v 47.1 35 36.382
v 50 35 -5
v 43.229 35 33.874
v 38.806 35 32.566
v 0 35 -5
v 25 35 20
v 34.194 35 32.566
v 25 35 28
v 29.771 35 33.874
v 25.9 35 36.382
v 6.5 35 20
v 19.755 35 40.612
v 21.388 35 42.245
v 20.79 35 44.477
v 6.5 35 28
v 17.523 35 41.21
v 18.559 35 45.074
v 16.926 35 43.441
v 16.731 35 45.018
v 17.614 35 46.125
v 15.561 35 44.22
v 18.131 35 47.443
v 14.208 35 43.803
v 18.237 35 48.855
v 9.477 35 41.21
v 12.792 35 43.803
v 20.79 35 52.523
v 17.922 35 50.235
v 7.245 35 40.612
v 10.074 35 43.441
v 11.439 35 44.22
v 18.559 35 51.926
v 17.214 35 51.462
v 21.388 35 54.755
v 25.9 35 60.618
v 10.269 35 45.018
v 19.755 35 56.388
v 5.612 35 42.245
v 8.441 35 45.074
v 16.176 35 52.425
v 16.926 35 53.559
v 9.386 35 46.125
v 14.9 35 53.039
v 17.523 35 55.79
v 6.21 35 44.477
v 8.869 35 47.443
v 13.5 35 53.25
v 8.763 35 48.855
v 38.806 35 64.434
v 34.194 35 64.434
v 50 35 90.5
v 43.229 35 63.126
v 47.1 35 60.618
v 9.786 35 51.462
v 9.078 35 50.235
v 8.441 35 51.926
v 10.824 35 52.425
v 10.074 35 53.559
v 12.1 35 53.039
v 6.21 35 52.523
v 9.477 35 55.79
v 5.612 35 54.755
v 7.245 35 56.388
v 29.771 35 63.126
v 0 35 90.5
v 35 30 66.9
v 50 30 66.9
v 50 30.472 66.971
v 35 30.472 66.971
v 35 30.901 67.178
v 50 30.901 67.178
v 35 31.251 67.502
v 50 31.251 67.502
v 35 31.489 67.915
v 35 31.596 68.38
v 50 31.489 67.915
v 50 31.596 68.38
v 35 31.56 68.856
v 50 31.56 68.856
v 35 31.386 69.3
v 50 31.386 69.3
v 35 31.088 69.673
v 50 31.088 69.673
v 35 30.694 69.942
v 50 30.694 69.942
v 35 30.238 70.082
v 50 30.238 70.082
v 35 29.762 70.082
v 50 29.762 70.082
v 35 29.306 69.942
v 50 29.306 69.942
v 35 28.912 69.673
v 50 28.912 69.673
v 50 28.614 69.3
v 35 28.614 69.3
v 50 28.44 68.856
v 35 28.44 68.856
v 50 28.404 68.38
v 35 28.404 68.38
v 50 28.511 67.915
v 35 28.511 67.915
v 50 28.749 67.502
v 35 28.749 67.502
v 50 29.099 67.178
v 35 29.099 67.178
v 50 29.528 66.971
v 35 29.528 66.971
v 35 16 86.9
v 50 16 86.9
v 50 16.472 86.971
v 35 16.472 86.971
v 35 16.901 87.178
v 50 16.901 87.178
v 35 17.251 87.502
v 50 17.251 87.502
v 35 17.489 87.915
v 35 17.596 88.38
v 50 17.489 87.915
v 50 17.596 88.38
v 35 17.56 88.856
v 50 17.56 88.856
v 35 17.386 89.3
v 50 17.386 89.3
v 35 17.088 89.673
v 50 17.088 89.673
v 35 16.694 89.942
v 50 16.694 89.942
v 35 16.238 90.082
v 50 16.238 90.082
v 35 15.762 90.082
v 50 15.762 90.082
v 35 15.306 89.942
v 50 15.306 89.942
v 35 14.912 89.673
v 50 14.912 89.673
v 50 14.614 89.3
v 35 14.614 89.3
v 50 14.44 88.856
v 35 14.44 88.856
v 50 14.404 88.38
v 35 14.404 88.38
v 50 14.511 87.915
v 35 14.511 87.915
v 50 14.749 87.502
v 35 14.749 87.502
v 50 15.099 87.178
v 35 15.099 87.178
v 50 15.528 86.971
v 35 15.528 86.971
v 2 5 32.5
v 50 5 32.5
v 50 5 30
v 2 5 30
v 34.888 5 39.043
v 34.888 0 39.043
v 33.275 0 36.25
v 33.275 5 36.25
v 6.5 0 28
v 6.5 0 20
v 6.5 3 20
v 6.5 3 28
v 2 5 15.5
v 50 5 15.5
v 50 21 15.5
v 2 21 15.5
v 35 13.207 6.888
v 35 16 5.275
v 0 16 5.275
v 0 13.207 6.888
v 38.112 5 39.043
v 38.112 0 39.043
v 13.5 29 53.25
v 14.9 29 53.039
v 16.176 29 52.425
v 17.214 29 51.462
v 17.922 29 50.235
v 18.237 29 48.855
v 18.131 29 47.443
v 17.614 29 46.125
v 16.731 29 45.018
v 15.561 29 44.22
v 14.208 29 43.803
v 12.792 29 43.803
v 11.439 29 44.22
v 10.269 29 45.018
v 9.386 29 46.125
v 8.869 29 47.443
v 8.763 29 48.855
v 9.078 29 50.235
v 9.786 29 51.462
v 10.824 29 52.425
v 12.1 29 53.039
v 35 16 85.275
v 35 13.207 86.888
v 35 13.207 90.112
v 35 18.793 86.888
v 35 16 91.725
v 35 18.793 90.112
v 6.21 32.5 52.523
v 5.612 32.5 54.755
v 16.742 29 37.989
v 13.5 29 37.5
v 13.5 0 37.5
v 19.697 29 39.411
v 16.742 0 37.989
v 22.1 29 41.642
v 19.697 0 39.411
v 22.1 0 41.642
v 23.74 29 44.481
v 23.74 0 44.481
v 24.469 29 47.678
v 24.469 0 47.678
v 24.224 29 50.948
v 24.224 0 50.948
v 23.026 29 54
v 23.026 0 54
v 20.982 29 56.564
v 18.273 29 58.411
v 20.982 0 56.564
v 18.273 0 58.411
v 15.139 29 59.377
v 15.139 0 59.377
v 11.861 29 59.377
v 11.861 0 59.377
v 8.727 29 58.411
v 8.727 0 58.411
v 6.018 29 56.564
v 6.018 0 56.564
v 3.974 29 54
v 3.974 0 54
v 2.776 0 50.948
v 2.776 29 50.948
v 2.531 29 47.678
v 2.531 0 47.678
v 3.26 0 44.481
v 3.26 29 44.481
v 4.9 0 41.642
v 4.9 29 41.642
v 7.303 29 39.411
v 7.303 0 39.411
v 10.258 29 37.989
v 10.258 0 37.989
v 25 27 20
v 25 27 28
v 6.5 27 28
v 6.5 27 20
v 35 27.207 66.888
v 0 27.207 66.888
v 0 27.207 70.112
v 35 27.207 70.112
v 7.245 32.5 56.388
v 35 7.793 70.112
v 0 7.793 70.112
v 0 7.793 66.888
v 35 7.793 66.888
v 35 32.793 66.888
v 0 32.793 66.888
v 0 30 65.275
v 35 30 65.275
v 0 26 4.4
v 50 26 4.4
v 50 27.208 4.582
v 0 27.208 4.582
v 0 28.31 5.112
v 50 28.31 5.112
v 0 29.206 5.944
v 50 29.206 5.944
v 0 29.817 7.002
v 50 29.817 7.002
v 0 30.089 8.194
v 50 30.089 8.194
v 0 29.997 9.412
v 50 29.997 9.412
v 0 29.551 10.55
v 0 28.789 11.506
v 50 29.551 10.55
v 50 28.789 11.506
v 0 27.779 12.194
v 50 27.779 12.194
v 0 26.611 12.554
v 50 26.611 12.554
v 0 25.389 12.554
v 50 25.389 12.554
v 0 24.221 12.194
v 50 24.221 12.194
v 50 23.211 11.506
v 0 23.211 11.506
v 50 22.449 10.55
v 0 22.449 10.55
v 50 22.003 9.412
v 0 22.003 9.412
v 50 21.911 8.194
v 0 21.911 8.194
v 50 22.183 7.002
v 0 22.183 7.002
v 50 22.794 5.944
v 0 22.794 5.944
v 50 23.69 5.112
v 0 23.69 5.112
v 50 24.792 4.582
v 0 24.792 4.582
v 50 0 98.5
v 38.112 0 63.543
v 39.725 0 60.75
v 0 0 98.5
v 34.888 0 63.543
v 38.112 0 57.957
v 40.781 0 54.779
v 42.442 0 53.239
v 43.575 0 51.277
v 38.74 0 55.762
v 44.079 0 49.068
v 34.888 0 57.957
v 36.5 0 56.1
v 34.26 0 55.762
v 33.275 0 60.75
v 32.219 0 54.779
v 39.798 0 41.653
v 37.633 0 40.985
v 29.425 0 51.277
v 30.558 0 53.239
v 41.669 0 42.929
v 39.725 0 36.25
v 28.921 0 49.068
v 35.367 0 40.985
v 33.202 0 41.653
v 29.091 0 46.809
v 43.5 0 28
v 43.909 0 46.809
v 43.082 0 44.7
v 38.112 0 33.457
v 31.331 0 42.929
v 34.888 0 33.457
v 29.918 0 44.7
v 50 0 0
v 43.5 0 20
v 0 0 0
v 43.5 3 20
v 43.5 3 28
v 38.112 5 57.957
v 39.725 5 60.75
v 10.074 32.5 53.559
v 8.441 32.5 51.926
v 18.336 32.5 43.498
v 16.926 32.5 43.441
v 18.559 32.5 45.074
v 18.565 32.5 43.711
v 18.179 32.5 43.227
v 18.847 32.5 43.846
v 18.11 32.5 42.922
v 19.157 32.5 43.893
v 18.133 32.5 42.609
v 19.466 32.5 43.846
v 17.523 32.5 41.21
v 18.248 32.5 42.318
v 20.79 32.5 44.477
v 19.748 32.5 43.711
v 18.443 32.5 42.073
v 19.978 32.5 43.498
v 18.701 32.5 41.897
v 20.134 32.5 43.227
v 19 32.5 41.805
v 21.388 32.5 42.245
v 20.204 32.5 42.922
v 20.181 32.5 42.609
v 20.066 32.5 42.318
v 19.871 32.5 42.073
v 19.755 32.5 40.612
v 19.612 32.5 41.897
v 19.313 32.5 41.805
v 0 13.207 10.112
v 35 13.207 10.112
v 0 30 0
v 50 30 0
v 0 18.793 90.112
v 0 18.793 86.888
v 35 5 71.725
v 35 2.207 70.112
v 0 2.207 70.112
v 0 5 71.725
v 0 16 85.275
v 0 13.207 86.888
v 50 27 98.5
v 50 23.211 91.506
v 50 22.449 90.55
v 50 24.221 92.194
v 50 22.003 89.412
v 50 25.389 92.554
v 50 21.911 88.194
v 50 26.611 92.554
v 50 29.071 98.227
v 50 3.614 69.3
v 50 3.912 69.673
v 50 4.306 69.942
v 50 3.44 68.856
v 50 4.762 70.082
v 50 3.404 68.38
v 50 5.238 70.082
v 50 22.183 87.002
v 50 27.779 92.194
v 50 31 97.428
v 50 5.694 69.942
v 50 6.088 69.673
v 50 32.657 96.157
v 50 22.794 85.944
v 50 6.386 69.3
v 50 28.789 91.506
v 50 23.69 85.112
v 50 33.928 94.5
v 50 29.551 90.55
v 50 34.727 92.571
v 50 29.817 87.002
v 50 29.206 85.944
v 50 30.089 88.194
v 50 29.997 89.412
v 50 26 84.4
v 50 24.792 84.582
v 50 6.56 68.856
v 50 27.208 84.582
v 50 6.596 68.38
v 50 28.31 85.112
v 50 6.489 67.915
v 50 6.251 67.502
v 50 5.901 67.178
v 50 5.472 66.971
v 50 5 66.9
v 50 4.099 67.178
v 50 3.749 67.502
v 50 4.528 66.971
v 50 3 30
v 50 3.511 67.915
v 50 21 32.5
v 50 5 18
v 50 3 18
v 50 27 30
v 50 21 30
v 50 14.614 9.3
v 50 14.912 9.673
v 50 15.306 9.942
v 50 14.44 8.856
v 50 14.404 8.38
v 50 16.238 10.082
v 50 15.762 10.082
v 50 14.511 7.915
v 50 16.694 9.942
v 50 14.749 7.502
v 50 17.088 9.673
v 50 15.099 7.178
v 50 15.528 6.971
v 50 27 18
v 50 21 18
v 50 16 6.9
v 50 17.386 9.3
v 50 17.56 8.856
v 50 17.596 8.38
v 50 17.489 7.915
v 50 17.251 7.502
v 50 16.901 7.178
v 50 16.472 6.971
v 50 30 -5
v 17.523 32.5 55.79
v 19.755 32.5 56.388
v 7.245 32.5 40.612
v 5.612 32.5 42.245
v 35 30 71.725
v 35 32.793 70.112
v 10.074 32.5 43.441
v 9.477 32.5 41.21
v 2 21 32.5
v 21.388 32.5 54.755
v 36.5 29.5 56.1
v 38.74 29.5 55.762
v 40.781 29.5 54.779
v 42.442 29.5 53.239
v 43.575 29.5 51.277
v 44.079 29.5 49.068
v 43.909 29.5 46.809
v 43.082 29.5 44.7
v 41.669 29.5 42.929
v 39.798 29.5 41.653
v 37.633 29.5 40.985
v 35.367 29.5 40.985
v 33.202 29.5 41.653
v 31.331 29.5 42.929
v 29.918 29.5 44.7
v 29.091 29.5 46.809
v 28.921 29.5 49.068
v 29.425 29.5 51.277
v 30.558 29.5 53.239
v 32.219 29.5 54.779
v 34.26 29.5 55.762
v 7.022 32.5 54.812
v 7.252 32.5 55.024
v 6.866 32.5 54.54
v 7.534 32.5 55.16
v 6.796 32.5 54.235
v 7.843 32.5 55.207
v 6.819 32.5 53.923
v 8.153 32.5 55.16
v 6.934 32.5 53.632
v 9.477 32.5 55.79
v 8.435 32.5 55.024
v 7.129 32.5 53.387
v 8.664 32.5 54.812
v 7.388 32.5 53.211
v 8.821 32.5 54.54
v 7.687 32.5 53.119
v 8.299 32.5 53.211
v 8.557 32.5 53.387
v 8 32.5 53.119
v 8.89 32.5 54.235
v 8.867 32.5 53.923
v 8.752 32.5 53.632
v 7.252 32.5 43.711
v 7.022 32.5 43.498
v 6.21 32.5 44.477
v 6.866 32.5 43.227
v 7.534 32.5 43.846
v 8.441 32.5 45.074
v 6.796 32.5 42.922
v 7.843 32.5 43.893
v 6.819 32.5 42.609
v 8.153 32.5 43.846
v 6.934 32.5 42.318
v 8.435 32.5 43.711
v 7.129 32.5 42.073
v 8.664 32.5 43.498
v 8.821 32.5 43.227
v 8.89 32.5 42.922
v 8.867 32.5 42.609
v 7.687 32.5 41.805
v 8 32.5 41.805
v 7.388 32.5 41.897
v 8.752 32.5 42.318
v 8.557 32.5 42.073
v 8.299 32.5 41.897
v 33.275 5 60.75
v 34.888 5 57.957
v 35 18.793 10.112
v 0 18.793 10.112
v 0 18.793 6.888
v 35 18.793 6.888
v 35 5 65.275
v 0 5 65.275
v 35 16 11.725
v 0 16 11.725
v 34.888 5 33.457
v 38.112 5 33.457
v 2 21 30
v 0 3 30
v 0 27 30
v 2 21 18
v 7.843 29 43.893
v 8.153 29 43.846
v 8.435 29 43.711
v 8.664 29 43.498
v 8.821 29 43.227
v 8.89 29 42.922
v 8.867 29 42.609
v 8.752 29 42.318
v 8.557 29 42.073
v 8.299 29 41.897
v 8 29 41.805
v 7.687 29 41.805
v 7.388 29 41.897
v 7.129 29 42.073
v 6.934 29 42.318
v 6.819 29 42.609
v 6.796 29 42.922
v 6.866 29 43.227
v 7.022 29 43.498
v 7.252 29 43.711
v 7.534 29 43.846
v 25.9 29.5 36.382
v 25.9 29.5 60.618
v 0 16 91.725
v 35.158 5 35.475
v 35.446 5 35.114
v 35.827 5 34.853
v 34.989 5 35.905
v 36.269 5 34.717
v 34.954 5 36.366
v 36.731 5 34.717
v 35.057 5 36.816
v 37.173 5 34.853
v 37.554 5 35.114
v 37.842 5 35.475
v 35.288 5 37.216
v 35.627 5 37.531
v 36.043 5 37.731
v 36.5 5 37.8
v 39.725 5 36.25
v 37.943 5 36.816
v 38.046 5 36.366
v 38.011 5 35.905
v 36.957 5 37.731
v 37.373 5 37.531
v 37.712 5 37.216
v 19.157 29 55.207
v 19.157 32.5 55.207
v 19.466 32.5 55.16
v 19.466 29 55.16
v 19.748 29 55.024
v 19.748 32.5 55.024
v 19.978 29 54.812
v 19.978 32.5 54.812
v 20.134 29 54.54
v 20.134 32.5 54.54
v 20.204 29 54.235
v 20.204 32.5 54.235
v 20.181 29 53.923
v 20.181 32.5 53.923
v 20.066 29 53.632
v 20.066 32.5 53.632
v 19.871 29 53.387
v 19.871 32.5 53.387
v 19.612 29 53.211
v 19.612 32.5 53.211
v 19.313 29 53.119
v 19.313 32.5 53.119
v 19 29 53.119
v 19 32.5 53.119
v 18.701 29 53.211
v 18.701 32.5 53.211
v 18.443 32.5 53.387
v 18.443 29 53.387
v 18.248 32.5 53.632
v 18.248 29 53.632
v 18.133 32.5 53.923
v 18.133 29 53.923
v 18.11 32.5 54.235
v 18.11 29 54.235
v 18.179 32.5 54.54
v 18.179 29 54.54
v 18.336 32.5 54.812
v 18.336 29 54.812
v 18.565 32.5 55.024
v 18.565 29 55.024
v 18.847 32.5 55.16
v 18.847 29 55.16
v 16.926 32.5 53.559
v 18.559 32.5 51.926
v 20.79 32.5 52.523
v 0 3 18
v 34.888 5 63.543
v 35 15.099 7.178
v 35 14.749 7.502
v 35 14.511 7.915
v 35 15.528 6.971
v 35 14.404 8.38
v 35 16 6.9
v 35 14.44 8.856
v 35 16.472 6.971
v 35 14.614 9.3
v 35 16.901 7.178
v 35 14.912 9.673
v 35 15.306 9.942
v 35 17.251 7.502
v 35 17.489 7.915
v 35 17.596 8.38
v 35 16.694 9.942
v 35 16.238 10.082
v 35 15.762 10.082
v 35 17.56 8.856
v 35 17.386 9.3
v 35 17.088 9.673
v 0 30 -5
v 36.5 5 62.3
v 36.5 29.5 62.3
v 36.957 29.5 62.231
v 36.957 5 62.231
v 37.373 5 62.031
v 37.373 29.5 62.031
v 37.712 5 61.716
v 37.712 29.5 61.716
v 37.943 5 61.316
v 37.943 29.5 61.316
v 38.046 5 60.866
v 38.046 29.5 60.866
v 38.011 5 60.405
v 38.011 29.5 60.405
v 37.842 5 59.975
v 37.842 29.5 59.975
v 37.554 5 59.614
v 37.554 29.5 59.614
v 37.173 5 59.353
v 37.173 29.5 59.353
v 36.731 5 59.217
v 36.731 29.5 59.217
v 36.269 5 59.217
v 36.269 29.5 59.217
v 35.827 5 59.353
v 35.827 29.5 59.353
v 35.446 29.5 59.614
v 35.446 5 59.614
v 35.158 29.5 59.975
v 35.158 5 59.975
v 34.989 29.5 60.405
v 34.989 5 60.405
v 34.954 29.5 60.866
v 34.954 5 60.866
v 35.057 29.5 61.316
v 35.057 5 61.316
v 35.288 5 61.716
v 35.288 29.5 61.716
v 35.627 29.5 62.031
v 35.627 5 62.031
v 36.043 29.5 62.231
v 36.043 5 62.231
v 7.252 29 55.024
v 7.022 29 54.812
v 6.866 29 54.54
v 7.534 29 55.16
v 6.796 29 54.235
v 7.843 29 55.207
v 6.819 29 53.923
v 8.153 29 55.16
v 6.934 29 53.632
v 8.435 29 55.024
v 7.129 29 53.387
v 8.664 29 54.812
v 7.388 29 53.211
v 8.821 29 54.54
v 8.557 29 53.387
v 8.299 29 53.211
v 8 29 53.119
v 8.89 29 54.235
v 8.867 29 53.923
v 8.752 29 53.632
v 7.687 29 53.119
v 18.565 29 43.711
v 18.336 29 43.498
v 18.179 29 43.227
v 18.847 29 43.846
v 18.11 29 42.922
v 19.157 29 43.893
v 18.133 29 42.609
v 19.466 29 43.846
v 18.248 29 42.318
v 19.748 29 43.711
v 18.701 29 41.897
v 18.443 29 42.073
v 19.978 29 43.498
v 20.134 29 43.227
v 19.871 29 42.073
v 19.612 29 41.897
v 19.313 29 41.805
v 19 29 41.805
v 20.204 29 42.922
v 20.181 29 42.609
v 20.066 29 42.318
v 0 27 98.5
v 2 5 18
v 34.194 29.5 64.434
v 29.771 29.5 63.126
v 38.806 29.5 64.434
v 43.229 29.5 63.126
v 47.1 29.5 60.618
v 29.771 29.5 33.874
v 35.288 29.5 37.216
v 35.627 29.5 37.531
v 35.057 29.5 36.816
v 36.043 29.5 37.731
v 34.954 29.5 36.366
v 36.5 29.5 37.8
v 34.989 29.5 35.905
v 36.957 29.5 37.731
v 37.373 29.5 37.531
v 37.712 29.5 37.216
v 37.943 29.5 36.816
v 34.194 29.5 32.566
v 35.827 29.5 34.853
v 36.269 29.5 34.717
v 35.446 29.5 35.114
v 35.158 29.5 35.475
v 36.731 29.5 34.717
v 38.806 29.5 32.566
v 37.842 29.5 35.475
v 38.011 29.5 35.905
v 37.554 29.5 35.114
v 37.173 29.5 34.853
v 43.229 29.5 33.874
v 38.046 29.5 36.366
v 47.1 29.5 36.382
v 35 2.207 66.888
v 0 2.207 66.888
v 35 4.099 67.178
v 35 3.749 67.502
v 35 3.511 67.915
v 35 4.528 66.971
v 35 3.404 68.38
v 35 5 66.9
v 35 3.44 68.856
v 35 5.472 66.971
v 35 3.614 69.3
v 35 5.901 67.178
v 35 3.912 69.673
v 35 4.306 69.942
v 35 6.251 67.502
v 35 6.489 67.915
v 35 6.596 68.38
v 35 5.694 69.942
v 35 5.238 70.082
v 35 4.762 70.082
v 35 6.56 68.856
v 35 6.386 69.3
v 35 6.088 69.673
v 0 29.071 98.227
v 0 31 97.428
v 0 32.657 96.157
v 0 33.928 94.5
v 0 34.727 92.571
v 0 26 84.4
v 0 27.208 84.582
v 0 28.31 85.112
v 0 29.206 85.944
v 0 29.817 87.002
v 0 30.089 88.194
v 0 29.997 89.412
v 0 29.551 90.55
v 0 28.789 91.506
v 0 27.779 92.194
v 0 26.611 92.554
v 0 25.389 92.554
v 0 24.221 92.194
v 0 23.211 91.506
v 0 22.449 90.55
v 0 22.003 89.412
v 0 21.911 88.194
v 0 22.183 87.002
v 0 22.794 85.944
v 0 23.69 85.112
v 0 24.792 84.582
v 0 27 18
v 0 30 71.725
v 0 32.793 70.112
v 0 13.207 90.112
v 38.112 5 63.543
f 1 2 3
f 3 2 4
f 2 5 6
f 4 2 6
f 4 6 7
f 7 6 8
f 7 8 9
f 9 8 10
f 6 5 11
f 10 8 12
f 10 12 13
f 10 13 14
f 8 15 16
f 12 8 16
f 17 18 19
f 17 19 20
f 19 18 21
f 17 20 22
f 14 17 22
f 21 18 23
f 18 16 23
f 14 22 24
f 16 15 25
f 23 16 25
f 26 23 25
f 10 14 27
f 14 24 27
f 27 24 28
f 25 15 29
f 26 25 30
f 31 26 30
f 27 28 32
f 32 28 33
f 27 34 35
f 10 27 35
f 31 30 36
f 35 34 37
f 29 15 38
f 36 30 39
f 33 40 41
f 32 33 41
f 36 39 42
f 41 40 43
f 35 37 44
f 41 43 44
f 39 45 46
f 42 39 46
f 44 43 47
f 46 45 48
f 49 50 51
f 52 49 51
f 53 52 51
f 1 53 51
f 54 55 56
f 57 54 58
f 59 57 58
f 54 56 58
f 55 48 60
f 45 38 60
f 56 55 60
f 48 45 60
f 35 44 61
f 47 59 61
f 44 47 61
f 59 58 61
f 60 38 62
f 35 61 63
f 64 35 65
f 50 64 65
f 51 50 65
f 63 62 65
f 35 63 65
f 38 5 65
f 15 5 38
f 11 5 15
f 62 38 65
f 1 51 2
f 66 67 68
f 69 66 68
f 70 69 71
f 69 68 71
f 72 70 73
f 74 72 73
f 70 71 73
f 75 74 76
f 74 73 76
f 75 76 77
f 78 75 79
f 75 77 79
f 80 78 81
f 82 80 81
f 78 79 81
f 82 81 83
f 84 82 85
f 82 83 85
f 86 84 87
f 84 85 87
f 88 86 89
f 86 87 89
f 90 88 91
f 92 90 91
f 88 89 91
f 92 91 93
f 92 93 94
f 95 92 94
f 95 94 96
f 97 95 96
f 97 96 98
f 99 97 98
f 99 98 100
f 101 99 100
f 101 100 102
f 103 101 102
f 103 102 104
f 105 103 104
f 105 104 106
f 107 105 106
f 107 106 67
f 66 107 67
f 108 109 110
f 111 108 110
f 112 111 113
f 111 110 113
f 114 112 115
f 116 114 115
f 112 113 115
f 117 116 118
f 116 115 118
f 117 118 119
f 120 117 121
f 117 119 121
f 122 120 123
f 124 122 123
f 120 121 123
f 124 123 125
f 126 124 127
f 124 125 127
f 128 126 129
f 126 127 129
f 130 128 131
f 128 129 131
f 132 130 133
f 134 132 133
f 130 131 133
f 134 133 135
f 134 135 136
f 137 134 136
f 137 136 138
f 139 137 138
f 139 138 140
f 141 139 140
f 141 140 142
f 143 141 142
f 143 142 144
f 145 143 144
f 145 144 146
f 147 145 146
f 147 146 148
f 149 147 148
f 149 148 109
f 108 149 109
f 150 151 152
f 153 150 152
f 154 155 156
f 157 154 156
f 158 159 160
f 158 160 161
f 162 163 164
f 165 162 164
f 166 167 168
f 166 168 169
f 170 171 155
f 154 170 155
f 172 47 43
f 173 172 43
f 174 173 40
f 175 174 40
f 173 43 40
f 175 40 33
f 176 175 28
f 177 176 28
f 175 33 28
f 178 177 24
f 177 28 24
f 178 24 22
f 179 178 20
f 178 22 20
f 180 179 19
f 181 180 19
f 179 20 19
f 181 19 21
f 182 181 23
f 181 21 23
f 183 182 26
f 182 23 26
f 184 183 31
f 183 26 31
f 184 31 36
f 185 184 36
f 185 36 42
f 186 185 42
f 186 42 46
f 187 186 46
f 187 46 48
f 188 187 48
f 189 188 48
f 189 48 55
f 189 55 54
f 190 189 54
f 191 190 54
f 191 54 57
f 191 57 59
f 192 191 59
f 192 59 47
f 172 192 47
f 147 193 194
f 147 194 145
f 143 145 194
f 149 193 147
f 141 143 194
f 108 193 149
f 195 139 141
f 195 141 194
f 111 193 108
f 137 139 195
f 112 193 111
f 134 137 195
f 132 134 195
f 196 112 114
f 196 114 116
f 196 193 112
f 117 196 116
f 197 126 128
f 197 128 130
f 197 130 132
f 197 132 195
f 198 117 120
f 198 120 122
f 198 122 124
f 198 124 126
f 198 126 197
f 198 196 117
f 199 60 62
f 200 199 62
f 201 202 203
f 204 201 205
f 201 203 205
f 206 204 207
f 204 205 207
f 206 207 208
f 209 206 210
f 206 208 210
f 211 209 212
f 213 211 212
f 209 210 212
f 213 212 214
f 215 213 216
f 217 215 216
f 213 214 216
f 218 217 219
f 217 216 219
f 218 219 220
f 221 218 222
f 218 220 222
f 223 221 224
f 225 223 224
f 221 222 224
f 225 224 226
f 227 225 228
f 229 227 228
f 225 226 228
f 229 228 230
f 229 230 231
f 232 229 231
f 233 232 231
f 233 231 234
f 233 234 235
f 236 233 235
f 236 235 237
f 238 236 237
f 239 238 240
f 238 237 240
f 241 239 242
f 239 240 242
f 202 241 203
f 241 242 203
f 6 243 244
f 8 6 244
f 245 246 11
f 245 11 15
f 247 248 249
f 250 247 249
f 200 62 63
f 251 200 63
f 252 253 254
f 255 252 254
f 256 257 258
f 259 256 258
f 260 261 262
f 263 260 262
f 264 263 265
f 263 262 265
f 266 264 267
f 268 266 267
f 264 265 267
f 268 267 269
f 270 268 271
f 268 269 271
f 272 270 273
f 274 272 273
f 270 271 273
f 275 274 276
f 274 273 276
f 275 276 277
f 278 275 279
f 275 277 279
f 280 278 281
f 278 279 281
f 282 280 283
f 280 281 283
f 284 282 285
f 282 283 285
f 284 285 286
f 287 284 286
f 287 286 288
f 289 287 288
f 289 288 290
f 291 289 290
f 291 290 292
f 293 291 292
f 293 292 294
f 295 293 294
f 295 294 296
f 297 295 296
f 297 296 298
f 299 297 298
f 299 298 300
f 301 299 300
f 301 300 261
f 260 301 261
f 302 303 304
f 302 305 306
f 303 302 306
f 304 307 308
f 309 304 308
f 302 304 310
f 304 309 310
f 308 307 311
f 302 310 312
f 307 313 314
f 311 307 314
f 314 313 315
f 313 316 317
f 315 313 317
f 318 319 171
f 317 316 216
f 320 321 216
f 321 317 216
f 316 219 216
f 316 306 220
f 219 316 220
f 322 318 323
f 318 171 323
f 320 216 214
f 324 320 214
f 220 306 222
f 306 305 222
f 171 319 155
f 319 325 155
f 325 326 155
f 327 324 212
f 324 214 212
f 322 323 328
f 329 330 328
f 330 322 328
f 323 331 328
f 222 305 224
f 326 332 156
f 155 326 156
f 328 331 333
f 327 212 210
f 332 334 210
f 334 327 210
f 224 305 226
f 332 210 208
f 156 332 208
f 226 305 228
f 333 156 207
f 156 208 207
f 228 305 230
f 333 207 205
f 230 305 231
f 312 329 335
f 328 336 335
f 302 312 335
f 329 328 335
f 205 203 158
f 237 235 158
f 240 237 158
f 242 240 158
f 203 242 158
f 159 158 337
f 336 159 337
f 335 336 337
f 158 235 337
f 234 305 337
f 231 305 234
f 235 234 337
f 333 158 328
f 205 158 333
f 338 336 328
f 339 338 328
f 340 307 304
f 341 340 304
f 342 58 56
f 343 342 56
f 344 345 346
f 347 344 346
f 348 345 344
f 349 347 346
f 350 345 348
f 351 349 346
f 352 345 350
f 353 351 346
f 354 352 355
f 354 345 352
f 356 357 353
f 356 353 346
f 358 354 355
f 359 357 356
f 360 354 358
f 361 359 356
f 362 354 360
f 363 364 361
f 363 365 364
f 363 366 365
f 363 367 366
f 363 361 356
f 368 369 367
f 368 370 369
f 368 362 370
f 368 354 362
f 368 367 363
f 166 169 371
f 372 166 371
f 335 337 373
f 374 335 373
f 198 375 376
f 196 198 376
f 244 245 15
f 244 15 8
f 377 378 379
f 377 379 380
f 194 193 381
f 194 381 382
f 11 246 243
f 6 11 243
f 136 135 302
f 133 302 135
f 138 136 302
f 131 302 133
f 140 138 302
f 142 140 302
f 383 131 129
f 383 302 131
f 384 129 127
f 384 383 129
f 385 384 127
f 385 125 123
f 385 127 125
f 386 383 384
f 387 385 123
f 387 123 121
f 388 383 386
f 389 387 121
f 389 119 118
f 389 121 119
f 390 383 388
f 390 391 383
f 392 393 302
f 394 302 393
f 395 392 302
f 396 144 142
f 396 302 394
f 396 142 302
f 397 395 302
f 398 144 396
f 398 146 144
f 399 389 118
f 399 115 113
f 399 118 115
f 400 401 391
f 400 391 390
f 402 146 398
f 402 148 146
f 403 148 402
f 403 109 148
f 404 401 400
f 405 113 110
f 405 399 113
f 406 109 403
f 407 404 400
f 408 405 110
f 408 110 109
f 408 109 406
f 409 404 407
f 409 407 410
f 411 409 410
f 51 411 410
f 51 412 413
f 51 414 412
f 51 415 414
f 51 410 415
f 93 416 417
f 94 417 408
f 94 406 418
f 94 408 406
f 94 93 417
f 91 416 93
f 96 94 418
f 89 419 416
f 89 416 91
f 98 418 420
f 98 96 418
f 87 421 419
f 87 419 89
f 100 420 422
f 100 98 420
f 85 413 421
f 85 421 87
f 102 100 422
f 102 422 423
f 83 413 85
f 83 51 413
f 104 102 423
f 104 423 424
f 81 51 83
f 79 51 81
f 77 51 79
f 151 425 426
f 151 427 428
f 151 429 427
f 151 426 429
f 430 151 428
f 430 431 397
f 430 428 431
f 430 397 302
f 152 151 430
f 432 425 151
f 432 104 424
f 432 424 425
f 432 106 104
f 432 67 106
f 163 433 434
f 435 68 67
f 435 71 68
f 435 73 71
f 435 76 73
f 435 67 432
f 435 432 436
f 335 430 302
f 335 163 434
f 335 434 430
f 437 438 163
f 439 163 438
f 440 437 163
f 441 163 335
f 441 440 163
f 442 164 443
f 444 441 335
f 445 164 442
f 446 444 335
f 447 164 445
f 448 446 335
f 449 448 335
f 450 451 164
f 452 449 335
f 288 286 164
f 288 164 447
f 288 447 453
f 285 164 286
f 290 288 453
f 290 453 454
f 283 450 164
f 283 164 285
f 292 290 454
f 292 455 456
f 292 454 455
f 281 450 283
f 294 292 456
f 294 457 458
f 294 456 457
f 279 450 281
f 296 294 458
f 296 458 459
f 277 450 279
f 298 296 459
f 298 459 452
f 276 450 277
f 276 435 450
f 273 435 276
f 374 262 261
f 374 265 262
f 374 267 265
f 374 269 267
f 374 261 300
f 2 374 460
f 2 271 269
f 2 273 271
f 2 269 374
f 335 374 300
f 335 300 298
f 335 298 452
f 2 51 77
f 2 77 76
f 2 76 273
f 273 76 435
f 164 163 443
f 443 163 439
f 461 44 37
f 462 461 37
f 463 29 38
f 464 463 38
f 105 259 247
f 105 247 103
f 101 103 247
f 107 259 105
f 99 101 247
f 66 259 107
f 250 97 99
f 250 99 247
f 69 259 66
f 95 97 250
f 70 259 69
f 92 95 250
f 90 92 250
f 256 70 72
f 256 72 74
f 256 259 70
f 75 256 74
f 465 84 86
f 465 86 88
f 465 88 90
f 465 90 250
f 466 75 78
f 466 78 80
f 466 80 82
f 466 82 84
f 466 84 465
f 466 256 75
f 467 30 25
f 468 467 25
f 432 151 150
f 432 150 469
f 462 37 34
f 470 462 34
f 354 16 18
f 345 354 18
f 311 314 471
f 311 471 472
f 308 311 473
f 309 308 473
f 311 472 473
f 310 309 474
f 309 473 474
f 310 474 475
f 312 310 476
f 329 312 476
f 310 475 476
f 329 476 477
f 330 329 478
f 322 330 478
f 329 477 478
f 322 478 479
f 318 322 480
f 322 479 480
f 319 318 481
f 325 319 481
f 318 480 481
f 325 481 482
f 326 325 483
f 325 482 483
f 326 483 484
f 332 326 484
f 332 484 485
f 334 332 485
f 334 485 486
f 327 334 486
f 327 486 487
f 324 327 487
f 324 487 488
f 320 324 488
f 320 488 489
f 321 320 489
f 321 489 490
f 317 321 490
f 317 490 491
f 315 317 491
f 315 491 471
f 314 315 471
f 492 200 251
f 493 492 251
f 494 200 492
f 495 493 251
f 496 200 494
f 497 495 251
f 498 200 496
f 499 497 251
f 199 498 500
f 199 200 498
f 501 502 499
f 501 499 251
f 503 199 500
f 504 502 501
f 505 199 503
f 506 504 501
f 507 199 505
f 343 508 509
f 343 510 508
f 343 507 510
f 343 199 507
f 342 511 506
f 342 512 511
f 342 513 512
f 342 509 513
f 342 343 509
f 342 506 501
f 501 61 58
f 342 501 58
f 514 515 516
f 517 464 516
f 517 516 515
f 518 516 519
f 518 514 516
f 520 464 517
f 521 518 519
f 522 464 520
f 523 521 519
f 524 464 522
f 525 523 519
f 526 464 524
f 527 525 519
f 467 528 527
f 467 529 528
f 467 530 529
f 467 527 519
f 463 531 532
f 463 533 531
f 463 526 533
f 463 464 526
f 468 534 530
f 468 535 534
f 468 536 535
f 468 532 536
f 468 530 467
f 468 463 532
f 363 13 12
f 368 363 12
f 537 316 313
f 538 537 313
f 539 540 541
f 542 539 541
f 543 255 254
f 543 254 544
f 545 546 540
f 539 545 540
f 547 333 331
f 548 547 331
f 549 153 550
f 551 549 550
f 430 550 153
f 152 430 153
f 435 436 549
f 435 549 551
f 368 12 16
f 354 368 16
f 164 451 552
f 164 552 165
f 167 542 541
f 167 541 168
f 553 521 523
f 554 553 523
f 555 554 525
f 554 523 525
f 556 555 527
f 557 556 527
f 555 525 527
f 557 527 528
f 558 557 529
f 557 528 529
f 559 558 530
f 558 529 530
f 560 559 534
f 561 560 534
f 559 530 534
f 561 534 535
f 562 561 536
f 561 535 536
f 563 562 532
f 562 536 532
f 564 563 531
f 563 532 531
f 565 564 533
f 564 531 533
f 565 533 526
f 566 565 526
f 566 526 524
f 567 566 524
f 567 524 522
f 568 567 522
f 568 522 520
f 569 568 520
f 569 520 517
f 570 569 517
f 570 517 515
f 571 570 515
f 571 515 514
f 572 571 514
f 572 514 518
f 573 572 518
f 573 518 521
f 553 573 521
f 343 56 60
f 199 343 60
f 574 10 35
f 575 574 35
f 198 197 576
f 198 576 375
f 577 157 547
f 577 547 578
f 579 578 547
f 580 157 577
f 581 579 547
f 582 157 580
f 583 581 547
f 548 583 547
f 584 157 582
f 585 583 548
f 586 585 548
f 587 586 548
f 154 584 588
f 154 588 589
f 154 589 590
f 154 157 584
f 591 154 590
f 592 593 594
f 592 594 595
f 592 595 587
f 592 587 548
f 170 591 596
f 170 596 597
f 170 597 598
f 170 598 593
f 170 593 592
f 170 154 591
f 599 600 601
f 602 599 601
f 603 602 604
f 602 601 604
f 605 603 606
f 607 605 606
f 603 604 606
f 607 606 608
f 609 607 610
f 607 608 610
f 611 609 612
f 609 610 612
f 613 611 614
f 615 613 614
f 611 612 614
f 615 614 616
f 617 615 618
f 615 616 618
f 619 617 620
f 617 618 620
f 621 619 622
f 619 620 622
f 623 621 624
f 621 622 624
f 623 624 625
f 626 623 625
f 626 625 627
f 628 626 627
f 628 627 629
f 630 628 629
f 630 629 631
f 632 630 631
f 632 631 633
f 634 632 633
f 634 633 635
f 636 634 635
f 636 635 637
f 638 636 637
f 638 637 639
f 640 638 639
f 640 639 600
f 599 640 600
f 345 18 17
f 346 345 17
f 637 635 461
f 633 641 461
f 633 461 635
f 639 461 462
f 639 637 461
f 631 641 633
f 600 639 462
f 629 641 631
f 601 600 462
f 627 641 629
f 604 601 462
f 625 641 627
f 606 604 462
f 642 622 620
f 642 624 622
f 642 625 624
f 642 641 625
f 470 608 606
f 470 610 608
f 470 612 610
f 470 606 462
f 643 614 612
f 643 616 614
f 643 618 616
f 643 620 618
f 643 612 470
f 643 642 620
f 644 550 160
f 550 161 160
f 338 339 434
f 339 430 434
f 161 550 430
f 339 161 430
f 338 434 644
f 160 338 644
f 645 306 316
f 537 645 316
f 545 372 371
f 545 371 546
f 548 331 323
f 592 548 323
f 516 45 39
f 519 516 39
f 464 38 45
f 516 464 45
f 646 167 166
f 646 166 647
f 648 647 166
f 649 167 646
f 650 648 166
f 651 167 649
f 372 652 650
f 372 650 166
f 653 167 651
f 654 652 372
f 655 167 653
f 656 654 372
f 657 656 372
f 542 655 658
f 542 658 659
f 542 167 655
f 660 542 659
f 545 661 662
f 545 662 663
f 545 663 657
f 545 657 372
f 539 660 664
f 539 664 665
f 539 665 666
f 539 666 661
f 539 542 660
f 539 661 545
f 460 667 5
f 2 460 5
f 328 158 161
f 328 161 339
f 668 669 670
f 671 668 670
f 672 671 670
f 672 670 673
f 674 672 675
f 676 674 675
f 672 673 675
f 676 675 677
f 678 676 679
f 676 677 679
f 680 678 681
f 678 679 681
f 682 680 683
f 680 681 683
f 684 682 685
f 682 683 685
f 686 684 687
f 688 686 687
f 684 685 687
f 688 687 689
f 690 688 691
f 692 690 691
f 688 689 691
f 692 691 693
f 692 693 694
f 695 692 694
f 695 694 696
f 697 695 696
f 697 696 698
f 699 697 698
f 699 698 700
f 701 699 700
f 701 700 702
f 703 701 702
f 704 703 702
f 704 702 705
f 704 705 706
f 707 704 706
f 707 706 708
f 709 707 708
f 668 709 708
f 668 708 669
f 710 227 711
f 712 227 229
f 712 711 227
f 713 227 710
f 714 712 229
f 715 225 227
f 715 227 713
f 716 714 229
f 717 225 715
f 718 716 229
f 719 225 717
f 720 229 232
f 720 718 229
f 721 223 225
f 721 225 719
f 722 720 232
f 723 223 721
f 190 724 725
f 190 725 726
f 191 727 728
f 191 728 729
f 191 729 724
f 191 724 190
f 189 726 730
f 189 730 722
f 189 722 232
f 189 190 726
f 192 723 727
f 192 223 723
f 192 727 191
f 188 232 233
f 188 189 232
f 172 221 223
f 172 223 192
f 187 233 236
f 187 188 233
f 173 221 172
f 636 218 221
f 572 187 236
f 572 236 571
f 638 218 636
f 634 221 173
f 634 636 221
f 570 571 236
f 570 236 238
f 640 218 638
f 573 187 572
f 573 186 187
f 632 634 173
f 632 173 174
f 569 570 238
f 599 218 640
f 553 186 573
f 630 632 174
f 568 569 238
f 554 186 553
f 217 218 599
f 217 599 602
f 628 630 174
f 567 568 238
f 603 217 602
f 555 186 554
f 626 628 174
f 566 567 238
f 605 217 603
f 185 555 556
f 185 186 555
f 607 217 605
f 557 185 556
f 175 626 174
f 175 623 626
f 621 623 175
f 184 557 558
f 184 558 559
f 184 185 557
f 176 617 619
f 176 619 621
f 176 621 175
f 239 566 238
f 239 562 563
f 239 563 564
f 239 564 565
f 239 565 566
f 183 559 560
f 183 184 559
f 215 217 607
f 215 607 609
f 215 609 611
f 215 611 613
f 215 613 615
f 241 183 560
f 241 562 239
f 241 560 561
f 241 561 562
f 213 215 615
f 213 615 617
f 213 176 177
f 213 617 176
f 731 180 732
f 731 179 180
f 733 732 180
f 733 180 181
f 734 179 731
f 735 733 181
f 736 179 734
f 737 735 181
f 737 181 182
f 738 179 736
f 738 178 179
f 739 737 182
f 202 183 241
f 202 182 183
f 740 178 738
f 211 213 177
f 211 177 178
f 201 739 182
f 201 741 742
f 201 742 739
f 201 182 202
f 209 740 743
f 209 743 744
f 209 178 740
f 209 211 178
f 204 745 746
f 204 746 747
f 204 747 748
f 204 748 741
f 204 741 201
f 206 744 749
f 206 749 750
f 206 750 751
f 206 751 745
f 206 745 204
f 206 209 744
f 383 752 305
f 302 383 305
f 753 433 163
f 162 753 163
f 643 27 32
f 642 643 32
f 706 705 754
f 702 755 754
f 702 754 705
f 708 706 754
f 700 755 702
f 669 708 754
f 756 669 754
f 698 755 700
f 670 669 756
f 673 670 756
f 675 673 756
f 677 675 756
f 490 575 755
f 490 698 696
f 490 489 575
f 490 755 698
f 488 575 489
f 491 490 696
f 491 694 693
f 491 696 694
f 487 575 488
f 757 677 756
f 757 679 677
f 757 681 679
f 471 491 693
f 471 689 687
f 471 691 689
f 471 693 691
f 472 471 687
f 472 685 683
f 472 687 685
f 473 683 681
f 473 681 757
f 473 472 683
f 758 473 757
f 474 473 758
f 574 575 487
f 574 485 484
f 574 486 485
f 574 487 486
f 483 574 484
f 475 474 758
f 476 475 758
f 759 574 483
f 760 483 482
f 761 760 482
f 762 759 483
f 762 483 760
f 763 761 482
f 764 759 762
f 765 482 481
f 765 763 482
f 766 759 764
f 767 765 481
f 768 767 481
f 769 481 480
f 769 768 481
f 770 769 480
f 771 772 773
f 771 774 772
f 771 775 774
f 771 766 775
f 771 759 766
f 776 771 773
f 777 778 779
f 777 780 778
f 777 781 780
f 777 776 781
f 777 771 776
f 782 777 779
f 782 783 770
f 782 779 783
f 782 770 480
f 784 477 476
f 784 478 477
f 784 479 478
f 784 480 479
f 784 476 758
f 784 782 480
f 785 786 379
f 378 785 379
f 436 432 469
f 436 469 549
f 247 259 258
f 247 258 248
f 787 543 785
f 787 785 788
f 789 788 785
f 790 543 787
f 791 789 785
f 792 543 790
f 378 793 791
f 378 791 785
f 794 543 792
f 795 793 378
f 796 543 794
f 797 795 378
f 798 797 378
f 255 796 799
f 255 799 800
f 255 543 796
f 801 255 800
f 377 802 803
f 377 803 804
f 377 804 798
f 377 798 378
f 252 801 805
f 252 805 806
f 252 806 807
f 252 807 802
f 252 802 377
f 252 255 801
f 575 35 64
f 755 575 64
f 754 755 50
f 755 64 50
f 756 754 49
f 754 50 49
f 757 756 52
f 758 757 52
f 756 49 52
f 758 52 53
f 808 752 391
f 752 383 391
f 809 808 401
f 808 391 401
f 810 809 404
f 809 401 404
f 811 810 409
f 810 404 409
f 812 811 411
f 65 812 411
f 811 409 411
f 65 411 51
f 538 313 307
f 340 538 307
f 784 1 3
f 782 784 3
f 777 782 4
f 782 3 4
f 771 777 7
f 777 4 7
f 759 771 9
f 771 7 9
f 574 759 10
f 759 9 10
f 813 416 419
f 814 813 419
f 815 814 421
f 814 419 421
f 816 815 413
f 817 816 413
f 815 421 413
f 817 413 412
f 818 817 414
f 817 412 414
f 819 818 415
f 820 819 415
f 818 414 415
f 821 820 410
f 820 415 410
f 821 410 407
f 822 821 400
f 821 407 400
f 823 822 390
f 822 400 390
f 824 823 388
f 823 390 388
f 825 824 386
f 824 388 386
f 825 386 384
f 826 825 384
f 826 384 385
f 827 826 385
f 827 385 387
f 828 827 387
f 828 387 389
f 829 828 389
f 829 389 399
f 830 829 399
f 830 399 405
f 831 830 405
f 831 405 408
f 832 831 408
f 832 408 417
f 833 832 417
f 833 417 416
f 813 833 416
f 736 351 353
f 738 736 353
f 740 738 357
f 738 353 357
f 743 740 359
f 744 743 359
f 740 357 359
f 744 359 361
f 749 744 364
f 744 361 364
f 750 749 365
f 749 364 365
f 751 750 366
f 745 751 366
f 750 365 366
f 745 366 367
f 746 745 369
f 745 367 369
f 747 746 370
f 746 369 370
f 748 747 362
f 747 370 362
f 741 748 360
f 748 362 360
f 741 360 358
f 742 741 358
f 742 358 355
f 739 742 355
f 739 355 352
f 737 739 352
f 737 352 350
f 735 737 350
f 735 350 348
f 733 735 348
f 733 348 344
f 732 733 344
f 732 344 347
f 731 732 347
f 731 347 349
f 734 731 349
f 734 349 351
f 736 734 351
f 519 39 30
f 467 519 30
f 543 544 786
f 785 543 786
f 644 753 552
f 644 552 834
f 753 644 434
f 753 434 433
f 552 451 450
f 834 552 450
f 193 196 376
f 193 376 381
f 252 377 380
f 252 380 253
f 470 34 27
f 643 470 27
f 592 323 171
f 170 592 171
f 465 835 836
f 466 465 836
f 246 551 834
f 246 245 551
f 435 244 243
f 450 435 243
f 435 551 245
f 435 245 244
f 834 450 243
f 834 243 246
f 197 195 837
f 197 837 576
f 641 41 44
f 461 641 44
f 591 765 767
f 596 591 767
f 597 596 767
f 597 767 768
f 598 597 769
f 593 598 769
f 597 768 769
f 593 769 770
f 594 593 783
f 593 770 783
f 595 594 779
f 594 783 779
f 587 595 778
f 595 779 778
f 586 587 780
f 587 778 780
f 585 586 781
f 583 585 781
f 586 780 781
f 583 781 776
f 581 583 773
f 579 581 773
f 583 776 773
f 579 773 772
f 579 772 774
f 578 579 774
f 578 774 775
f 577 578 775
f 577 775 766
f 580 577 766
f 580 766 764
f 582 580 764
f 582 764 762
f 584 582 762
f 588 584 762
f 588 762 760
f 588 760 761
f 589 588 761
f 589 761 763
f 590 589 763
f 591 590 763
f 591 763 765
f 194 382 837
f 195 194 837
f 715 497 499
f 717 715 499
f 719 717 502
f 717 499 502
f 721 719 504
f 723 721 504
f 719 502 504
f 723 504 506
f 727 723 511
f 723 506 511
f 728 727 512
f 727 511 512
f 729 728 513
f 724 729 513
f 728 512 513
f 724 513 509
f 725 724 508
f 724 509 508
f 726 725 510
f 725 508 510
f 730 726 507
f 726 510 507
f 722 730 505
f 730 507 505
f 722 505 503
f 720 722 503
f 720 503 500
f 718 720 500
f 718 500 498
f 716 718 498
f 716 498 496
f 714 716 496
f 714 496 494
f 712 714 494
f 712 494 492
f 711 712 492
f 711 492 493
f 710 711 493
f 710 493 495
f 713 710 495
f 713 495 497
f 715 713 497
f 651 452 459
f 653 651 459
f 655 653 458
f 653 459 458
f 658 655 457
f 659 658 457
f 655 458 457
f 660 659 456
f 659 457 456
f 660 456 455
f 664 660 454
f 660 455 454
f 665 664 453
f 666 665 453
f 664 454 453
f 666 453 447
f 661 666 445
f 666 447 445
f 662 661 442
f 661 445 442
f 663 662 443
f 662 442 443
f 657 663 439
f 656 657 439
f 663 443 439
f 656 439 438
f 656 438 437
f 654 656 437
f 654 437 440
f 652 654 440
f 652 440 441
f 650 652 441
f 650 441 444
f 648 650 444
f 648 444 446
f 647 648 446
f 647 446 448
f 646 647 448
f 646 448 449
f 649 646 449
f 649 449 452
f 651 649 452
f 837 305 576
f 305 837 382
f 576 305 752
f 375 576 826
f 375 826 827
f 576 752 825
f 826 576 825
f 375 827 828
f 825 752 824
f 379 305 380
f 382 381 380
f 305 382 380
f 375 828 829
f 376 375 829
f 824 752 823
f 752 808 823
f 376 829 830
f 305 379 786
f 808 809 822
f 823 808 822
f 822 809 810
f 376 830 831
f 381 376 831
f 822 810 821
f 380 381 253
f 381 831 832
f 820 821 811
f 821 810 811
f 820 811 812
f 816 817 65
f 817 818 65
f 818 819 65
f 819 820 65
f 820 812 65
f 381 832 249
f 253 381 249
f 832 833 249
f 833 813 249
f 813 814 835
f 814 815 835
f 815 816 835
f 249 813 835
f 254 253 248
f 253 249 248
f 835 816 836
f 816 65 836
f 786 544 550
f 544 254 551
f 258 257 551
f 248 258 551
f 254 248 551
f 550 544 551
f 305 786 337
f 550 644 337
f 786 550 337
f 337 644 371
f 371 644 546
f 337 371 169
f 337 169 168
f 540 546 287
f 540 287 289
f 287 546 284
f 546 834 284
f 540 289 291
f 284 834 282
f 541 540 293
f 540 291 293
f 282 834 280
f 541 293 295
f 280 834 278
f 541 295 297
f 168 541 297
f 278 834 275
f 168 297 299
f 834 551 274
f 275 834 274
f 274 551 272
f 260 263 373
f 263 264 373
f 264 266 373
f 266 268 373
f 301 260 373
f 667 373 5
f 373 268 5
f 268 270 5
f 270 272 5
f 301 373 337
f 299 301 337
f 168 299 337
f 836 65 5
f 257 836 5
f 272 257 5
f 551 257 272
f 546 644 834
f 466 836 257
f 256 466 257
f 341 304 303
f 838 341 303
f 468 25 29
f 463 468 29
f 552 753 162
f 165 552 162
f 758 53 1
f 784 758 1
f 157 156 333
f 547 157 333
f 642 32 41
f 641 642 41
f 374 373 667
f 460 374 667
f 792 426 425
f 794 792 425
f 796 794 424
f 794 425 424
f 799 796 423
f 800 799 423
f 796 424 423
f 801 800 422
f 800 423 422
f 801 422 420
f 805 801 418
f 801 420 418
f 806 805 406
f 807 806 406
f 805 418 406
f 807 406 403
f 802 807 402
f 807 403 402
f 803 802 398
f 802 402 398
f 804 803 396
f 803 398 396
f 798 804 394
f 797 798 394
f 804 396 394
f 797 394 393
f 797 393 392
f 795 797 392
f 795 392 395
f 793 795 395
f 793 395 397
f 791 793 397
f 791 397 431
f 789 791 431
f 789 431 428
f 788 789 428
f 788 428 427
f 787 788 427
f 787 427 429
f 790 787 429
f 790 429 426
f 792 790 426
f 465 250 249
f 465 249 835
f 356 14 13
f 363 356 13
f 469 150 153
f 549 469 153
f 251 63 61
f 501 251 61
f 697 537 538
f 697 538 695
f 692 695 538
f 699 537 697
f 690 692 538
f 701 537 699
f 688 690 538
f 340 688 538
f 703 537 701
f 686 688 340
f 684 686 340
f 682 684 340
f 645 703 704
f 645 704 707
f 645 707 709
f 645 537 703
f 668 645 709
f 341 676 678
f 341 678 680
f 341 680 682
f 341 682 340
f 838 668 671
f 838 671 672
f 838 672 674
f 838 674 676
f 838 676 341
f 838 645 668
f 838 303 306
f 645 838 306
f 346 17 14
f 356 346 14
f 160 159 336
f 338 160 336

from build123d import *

# Parameters (mm, degrees)
BOSS_EXTRUDE1_DEPTH            = 50
SKETCH2_R                      = 7.6
SKETCH2_R_2                    = 4.75
SKETCH2_R_3                    = 1.55
SKETCH2_R_4                    = 1.05
CUT_EXTRUDE1_DEPTH             = 116.876011322
CUT_EXTRUDE2_DEPTH             = 5.5
SKETCH4_R                      = 11
CUT_EXTRUDE3_DEPTH             = 29
CUT_EXTRUDE4_DEPTH             = 5
CUT_EXTRUDE5_DEPTH             = 2.5
SKETCH7_R                      = 4.1
SKETCH7_R_2                    = 1.6
SKETCH7_W                      = 12
SKETCH7_H                      = 24
CUT_EXTRUDE6_DEPTH             = 116.876011322
CUT_EXTRUDE7_DEPTH             = 35
SKETCH9_W                      = 17
SKETCH9_H                      = 16
CUT_EXTRUDE8_DEPTH             = 48
CUT_EXTRUDE9_REACH             = 117.876
SKETCH10_W                     = 37
SKETCH10_H                     = 8
CUT_EXTRUDE9_DIRECTION_2_DEPTH = 116.876011322
CUT_EXTRUDE10_REACH            = 115.716
SKETCH11_W                     = 18.5
SKETCH11_H                     = 8
FILLET1_R                      = 8


with BuildPart() as part:
    # Sketch1 → Boss-Extrude1 (new body)
    with BuildSketch(Plane(origin=(0, 0, 0), x_dir=(0, 0, -1), z_dir=(1, 0, 0))):
        Polygon((0, 0), (0, 30), (5, 30), (5, 35), (-98.5, 35), (-98.5, 0), align=None)
    extrude(amount=BOSS_EXTRUDE1_DEPTH)

    # Sketch2 → Cut-Extrude1 (cut, through all)
    with BuildSketch(Plane(origin=(0, 35, 0), x_dir=(1, 0, 0), z_dir=(0, 1, 0))):
        with Locations(Location((36.5, -48.5, 0), (0, 0, 270))):
            Circle(SKETCH2_R)
        with Locations(Location((13.5, -48.5, 0), (0, 0, 270))):
            Circle(SKETCH2_R_2)
        with Locations(Location((36.5, -36.25, 0), (0, 0, 270))):
            Circle(SKETCH2_R_3)
        with Locations(Location((36.5, -60.75, 0), (0, 0, 270))):
            Circle(SKETCH2_R_3)
        with Locations(Location((19.156854249, -42.843145751, 0), (0, 0, 270))):
            Circle(SKETCH2_R_4)
        with Locations(Location((19.156854249, -54.156854249, 0), (0, 0, 270))):
            Circle(SKETCH2_R_4)
        with Locations(Location((7.843145751, -54.156854249, 0), (0, 0, 270))):
            Circle(SKETCH2_R_4)
        with Locations(Location((7.843145751, -42.843145751, 0), (0, 0, 270))):
            Circle(SKETCH2_R_4)
    extrude(amount=-CUT_EXTRUDE1_DEPTH, mode=Mode.SUBTRACT)

    # Sketch3 → Cut-Extrude2 (cut)
    with BuildSketch(Plane(origin=(0, 35, 0), x_dir=(1, 0, 0), z_dir=(0, 1, 0))):
        with BuildLine():
            Line((25.9, -36.381831822), (25.9, -60.618168178))
            ThreePointArc((25.9, -60.618168178), (36.5, -64.6), (47.1, -60.618168178))
            Line((47.1, -60.618168178), (47.1, -36.381831822))
            ThreePointArc((47.1, -36.381831822), (36.5, -32.4), (25.9, -36.381831822))
        make_face()
    extrude(amount=-CUT_EXTRUDE2_DEPTH, mode=Mode.SUBTRACT)

    # Sketch4 → Cut-Extrude3 (cut)
    with BuildSketch(Plane.XZ):
        with Locations(Location((13.5, 48.5, 0), (0, 0, 270))):
            Circle(SKETCH4_R)
    extrude(amount=-CUT_EXTRUDE3_DEPTH, mode=Mode.SUBTRACT)

    # Sketch5 → Cut-Extrude4 (cut)
    with BuildSketch(Plane.XZ):
        Polygon((39.725, 60.75), (38.1125, 63.542931927), (34.8875, 63.542931927), (33.275, 60.75), (34.8875, 57.957068073), (38.1125, 57.957068073), align=None)
        Polygon((38.1125, 39.042931927), (34.8875, 39.042931927), (33.275, 36.25), (34.8875, 33.457068073), (38.1125, 33.457068073), (39.725, 36.25), align=None)
    extrude(amount=-CUT_EXTRUDE4_DEPTH, mode=Mode.SUBTRACT)

    # Sketch6 → Cut-Extrude5 (cut)
    with BuildSketch(Plane(origin=(0, 35, 0), x_dir=(1, 0, 0), z_dir=(0, 1, 0))):
        Polygon((21.388142908, -42.245273756), (19.754726244, -40.611857092), (17.523437585, -41.209729086), (16.925565591, -43.441017745), (18.558982255, -45.074434409), (20.790270914, -44.476562415), align=None)
        Polygon((21.388142908, -54.754726244), (20.790270914, -52.523437585), (18.558982255, -51.925565591), (16.925565591, -53.558982255), (17.523437585, -55.790270914), (19.754726244, -56.388142908), align=None)
        Polygon((7.245273756, -56.388142908), (9.476562415, -55.790270914), (10.074434409, -53.558982255), (8.441017745, -51.925565591), (6.209729086, -52.523437585), (5.611857092, -54.754726244), align=None)
        Polygon((5.611857092, -42.245273756), (6.209729086, -44.476562415), (8.441017745, -45.074434409), (10.074434409, -43.441017745), (9.476562415, -41.209729086), (7.245273756, -40.611857092), align=None)
    extrude(amount=-CUT_EXTRUDE5_DEPTH, mode=Mode.SUBTRACT)

    # Sketch7 → Cut-Extrude6 (cut, through all)
    with BuildSketch(Plane(origin=(50, 0, 0), x_dir=(0, 0, -1), z_dir=(1, 0, 0))):
        with Locations((-8.5, 26)):
            Circle(SKETCH7_R)
        with Locations((-88.5, 26)):
            Circle(SKETCH7_R)
        with Locations((-88.5, 16)):
            Circle(SKETCH7_R_2)
        with Locations((-8.5, 16)):
            Circle(SKETCH7_R_2)
        with Locations((-68.5, 30)):
            Circle(SKETCH7_R_2)
        with Locations((-68.5, 5)):
            Circle(SKETCH7_R_2)
        with Locations((-24, 15)):
            Rectangle(SKETCH7_W, SKETCH7_H)
    extrude(amount=-CUT_EXTRUDE6_DEPTH, mode=Mode.SUBTRACT)

    # Sketch8 → Cut-Extrude7 (cut)
    with BuildSketch(Plane.ZY):
        Polygon((11.725, 16), (10.1125, 18.792931927), (6.8875, 18.792931927), (5.275, 16), (6.8875, 13.207068073), (10.1125, 13.207068073), align=None)
        Polygon((65.275, 30), (66.8875, 27.207068073), (70.1125, 27.207068073), (71.725, 30), (70.1125, 32.792931927), (66.8875, 32.792931927), align=None)
        Polygon((65.275, 5), (66.8875, 2.207068073), (70.1125, 2.207068073), (71.725, 5), (70.1125, 7.792931927), (66.8875, 7.792931927), align=None)
        Polygon((85.275, 16), (86.8875, 13.207068073), (90.1125, 13.207068073), (91.725, 16), (90.1125, 18.792931927), (86.8875, 18.792931927), align=None)
    extrude(amount=-CUT_EXTRUDE7_DEPTH, mode=Mode.SUBTRACT)

    # Sketch9 → Cut-Extrude8 (cut)
    with BuildSketch(Plane(origin=(50, 0, 0), x_dir=(0, 0, -1), z_dir=(1, 0, 0))):
        with Locations((-24, 13)):
            Rectangle(SKETCH9_W, SKETCH9_H)
    extrude(amount=-CUT_EXTRUDE8_DEPTH, mode=Mode.SUBTRACT)

    # Sketch10 → Cut-Extrude9 (cut, up to next)
    with BuildSketch(Plane.XZ, mode=Mode.PRIVATE) as cut_extrude9_sk1:
        with Locations((25, 24)):
            Rectangle(SKETCH10_W, SKETCH10_H)
    cut_extrude9_tool1 = extrude(cut_extrude9_sk1.sketch, amount=-CUT_EXTRUDE9_REACH, mode=Mode.PRIVATE) & part.part
    add(cut_extrude9_tool1.solids().sort_by_distance((25, 0, 24))[0], mode=Mode.SUBTRACT)

    # Sketch10 → Cut-Extrude9 direction 2 (cut)
    with BuildSketch(Plane.XZ):
        with Locations((25, 24)):
            Rectangle(SKETCH10_W, SKETCH10_H)
    extrude(amount=CUT_EXTRUDE9_DIRECTION_2_DEPTH, mode=Mode.SUBTRACT)

    # Sketch11 → Cut-Extrude10 (cut, up to next)
    with BuildSketch(Plane.XZ.offset(-27), mode=Mode.PRIVATE) as cut_extrude10_sk1:
        with Locations((15.75, 24)):
            Rectangle(SKETCH11_W, SKETCH11_H)
    cut_extrude10_tool1 = extrude(cut_extrude10_sk1.sketch, amount=-CUT_EXTRUDE10_REACH, mode=Mode.PRIVATE) & part.part
    add(cut_extrude10_tool1.solids().sort_by_distance((15.75, 27, 24))[0], mode=Mode.SUBTRACT)

    # Fillet1
    fillet1_edges = [part.edges().sort_by_distance(p)[0] for p in [
        (25, 35, 98.5),
    ]]
    fillet(fillet1_edges, radius=FILLET1_R)


solid = part.part
